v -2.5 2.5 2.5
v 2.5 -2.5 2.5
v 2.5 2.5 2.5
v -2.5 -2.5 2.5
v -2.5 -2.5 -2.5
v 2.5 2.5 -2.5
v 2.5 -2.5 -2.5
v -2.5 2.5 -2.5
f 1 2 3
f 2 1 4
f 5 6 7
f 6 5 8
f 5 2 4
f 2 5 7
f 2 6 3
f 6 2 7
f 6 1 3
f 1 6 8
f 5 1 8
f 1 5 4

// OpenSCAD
$fa=12.000000;
$fs=2.000000;
$fn=0;
cube([5.000000, 5.000000, 5.000000], center=true);
